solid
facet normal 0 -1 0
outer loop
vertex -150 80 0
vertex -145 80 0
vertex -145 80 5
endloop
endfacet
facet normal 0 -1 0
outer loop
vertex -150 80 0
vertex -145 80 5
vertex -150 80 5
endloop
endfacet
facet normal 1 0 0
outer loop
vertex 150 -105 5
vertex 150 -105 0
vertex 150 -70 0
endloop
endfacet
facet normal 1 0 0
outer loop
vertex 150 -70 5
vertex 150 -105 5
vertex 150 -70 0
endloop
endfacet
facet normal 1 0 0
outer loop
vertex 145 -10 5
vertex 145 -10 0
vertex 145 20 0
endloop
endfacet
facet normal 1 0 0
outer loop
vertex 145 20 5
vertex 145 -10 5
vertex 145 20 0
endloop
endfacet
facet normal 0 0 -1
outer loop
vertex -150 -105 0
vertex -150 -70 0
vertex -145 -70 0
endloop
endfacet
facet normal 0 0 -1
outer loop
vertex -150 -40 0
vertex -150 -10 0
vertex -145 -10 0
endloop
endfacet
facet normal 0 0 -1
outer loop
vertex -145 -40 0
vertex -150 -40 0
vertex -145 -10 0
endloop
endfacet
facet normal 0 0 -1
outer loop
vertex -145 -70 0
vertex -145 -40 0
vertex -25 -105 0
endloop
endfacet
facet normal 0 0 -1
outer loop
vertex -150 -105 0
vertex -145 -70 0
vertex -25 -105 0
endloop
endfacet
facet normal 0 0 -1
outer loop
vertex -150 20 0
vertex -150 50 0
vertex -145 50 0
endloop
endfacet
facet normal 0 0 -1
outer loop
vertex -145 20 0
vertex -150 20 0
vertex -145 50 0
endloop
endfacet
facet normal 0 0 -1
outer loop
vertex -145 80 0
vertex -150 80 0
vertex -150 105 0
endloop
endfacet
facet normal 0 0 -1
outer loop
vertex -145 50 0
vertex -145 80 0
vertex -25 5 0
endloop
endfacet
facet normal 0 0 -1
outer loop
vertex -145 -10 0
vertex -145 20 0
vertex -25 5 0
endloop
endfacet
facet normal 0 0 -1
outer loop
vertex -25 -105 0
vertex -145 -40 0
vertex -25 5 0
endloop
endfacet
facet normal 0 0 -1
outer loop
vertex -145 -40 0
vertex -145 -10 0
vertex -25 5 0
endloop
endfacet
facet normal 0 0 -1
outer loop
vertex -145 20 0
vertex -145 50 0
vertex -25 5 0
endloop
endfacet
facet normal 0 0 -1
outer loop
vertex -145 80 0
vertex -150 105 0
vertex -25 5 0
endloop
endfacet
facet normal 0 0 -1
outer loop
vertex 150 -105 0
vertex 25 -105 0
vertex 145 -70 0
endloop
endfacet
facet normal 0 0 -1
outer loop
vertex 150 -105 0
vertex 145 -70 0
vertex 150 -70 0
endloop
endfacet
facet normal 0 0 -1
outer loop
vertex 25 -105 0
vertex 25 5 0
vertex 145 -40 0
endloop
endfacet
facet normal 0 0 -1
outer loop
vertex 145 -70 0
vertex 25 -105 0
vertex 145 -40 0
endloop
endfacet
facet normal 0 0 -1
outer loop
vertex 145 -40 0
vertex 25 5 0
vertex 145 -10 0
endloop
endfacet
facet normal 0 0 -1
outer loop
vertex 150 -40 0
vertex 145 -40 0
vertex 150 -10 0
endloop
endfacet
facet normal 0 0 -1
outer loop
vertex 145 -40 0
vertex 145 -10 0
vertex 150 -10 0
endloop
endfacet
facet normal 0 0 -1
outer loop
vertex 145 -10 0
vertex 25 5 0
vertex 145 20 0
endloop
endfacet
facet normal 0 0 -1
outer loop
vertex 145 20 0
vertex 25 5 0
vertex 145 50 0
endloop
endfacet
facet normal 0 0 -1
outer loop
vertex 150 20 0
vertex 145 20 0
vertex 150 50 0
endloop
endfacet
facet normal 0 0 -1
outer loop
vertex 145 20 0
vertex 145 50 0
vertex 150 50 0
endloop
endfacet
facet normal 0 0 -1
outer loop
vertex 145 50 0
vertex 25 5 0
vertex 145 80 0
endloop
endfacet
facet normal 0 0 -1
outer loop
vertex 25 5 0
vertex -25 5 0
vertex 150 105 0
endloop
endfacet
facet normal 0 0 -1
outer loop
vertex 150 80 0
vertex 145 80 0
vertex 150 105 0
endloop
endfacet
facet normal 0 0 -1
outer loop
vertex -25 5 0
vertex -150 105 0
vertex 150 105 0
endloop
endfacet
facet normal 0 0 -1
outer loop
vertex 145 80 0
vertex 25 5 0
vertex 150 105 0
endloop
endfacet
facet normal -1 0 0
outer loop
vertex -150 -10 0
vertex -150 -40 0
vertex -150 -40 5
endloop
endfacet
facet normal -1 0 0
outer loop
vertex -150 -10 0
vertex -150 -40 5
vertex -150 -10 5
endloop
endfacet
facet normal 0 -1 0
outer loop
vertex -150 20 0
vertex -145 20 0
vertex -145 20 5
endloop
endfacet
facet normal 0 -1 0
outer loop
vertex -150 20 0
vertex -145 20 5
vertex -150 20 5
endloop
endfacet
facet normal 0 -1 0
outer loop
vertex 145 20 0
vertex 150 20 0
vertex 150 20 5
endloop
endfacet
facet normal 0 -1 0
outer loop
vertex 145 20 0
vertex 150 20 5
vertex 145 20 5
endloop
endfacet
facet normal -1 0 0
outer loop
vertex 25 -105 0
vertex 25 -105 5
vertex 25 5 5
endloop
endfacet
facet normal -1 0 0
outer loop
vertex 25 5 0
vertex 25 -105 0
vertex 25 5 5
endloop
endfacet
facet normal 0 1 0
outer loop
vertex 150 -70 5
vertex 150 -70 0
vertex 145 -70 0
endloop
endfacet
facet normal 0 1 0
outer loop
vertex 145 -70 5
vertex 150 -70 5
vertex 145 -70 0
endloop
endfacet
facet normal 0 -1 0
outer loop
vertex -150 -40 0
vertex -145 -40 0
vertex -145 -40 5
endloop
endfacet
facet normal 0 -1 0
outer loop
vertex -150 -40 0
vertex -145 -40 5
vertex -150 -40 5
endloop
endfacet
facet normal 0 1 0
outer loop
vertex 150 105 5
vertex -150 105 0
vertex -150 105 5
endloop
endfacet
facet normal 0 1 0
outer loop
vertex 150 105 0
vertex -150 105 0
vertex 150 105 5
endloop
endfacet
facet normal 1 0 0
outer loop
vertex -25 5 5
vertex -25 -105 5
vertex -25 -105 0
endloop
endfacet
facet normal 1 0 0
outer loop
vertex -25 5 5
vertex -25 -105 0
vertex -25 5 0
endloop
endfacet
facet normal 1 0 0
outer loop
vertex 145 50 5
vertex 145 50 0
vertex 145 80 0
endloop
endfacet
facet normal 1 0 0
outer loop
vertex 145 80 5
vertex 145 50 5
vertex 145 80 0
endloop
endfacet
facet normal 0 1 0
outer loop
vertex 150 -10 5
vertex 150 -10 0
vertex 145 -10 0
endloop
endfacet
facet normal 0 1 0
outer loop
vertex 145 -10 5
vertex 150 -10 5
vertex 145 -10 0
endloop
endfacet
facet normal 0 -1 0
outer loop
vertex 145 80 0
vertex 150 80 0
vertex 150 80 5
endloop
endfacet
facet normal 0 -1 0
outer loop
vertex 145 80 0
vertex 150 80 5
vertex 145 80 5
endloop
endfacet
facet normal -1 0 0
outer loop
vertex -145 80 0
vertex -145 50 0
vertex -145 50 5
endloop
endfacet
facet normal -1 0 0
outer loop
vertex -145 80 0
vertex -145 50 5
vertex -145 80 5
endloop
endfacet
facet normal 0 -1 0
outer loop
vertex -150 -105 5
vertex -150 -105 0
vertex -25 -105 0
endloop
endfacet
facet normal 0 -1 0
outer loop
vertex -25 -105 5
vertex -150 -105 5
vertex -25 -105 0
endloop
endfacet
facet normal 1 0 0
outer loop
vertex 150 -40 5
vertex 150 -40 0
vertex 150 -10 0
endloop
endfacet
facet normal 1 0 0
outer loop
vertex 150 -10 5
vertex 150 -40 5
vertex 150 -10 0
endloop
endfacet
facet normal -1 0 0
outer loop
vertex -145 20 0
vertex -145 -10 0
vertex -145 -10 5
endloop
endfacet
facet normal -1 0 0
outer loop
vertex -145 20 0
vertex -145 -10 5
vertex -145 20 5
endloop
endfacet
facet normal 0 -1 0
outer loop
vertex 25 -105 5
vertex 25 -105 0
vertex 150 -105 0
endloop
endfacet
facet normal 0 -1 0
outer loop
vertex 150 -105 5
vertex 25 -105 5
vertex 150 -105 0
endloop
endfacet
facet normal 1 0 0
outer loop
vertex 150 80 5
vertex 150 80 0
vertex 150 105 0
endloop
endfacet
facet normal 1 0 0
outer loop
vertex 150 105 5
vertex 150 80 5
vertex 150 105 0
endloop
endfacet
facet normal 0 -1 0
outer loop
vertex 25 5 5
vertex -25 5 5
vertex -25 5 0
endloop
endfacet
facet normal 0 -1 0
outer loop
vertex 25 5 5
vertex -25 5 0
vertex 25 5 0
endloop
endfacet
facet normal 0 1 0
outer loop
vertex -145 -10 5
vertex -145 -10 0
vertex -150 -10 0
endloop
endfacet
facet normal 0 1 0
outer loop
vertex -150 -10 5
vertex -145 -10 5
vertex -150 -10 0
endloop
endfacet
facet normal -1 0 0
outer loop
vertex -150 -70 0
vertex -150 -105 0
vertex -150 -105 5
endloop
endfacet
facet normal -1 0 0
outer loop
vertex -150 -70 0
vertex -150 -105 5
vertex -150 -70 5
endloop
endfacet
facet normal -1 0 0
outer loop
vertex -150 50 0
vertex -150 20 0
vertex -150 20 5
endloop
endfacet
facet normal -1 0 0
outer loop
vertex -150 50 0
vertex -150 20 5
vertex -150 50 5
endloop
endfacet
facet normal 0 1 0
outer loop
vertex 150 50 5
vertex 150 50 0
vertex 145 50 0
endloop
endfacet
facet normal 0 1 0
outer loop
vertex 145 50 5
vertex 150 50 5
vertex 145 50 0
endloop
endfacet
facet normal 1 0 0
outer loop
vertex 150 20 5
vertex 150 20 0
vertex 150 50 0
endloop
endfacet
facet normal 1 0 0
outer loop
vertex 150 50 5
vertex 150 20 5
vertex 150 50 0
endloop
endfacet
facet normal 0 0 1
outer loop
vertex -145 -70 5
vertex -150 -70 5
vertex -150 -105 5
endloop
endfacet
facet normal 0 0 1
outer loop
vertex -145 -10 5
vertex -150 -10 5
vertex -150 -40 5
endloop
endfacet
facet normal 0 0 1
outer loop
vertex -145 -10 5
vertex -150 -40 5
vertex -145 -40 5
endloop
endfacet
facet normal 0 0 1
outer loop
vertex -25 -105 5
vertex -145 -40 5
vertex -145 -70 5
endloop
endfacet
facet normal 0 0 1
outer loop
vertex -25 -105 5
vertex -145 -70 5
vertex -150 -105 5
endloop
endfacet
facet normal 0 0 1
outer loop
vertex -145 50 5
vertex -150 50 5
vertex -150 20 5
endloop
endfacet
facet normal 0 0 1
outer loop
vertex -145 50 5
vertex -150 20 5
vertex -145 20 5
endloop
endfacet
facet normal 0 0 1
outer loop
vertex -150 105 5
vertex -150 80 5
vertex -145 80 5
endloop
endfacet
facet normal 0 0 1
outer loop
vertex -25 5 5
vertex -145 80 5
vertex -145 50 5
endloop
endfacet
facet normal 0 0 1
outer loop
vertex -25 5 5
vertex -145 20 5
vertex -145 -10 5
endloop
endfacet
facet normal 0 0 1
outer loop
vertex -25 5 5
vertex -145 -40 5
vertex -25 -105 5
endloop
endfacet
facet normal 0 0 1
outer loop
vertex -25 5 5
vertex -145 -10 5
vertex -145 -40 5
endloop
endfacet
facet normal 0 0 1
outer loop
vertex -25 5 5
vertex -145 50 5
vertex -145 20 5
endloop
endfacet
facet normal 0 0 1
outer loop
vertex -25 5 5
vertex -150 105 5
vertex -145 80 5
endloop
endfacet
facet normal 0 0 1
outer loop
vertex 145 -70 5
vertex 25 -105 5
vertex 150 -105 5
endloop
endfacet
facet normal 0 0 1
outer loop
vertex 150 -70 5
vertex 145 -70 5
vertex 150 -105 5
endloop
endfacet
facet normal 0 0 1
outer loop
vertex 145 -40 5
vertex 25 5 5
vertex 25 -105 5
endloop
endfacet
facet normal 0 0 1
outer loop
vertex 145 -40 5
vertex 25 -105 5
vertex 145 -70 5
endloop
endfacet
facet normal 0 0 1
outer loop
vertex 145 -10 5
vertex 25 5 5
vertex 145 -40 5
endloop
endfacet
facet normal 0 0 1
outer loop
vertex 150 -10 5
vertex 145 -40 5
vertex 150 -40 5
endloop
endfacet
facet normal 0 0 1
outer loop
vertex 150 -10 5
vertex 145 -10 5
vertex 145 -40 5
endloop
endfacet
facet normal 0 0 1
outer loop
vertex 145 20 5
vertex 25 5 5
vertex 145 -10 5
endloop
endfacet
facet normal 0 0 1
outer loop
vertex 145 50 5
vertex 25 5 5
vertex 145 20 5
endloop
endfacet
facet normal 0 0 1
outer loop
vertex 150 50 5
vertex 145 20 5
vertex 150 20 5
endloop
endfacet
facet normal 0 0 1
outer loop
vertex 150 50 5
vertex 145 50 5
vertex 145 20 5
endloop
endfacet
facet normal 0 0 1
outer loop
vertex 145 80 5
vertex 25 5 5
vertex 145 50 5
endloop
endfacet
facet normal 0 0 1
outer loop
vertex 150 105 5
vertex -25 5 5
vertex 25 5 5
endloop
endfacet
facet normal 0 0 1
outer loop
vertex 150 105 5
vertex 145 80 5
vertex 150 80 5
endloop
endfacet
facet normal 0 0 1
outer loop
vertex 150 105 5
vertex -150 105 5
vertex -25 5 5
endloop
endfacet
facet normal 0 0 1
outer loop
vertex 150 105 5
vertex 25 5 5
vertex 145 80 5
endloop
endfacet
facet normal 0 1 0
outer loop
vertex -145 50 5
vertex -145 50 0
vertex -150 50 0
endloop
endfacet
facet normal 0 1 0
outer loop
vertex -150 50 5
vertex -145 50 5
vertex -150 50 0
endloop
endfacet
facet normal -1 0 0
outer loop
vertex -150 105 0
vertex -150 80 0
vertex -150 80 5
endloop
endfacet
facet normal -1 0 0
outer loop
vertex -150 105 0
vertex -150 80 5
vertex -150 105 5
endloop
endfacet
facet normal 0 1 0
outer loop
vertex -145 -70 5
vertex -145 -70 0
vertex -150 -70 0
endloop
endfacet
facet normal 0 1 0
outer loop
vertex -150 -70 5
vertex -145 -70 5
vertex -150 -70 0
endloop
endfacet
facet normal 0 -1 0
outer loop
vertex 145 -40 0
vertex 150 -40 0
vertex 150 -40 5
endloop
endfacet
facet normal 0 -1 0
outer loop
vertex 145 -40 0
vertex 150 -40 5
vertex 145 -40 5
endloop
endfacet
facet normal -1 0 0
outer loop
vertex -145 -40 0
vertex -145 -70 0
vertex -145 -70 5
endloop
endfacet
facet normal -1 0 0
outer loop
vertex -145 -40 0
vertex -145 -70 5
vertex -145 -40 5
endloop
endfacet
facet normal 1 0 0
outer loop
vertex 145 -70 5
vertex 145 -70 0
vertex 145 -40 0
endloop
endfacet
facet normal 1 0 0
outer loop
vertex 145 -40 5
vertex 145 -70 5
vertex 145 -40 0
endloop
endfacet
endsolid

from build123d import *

# Parameters (mm, degrees)
SKETCH1_W           = 300
SKETCH1_H           = 210
BOSS_EXTRUDE1_DEPTH = 5
SKETCH2_W           = 67.619836516
SKETCH2_H           = 30
SKETCH2_W_2         = 72.619836516
SKETCH2_W_3         = 53.212613818
CUT_EXTRUDE1_DEPTH  = 6
SKETCH3_W           = 50
SKETCH3_H           = 110
CUT_EXTRUDE2_DEPTH  = 6


with BuildPart() as part:
    # Sketch1 → Boss-Extrude1 (new body)
    with BuildSketch(Plane.XY):
        Rectangle(SKETCH1_W, SKETCH1_H)
    extrude(amount=BOSS_EXTRUDE1_DEPTH)

    # Sketch2 → Cut-Extrude1 (cut, through all)
    with BuildSketch(Plane(origin=(0, 0, 0), x_dir=(-1, 0, 0), z_dir=(0, 0, -1))):
        with Locations((-178.809918258, 65)):
            Rectangle(SKETCH2_W, SKETCH2_H)
        with Locations((-181.309918258, 5)):
            Rectangle(SKETCH2_W_2, SKETCH2_H)
        with Locations((-181.309918258, -55)):
            Rectangle(SKETCH2_W_2, SKETCH2_H)
        with Locations((171.606306909, 65)):
            Rectangle(SKETCH2_W_3, SKETCH2_H)
        with Locations((181.309918258, 5)):
            Rectangle(SKETCH2_W_2, SKETCH2_H)
        with Locations((181.309918258, -55)):
            Rectangle(SKETCH2_W_2, SKETCH2_H)
    extrude(amount=-CUT_EXTRUDE1_DEPTH, mode=Mode.SUBTRACT)

    # Sketch3 → Cut-Extrude2 (cut, through all)
    with BuildSketch(Plane.XY.offset(5)):
        with Locations((0, -50)):
            Rectangle(SKETCH3_W, SKETCH3_H)
    extrude(amount=-CUT_EXTRUDE2_DEPTH, mode=Mode.SUBTRACT)


solid = part.part
